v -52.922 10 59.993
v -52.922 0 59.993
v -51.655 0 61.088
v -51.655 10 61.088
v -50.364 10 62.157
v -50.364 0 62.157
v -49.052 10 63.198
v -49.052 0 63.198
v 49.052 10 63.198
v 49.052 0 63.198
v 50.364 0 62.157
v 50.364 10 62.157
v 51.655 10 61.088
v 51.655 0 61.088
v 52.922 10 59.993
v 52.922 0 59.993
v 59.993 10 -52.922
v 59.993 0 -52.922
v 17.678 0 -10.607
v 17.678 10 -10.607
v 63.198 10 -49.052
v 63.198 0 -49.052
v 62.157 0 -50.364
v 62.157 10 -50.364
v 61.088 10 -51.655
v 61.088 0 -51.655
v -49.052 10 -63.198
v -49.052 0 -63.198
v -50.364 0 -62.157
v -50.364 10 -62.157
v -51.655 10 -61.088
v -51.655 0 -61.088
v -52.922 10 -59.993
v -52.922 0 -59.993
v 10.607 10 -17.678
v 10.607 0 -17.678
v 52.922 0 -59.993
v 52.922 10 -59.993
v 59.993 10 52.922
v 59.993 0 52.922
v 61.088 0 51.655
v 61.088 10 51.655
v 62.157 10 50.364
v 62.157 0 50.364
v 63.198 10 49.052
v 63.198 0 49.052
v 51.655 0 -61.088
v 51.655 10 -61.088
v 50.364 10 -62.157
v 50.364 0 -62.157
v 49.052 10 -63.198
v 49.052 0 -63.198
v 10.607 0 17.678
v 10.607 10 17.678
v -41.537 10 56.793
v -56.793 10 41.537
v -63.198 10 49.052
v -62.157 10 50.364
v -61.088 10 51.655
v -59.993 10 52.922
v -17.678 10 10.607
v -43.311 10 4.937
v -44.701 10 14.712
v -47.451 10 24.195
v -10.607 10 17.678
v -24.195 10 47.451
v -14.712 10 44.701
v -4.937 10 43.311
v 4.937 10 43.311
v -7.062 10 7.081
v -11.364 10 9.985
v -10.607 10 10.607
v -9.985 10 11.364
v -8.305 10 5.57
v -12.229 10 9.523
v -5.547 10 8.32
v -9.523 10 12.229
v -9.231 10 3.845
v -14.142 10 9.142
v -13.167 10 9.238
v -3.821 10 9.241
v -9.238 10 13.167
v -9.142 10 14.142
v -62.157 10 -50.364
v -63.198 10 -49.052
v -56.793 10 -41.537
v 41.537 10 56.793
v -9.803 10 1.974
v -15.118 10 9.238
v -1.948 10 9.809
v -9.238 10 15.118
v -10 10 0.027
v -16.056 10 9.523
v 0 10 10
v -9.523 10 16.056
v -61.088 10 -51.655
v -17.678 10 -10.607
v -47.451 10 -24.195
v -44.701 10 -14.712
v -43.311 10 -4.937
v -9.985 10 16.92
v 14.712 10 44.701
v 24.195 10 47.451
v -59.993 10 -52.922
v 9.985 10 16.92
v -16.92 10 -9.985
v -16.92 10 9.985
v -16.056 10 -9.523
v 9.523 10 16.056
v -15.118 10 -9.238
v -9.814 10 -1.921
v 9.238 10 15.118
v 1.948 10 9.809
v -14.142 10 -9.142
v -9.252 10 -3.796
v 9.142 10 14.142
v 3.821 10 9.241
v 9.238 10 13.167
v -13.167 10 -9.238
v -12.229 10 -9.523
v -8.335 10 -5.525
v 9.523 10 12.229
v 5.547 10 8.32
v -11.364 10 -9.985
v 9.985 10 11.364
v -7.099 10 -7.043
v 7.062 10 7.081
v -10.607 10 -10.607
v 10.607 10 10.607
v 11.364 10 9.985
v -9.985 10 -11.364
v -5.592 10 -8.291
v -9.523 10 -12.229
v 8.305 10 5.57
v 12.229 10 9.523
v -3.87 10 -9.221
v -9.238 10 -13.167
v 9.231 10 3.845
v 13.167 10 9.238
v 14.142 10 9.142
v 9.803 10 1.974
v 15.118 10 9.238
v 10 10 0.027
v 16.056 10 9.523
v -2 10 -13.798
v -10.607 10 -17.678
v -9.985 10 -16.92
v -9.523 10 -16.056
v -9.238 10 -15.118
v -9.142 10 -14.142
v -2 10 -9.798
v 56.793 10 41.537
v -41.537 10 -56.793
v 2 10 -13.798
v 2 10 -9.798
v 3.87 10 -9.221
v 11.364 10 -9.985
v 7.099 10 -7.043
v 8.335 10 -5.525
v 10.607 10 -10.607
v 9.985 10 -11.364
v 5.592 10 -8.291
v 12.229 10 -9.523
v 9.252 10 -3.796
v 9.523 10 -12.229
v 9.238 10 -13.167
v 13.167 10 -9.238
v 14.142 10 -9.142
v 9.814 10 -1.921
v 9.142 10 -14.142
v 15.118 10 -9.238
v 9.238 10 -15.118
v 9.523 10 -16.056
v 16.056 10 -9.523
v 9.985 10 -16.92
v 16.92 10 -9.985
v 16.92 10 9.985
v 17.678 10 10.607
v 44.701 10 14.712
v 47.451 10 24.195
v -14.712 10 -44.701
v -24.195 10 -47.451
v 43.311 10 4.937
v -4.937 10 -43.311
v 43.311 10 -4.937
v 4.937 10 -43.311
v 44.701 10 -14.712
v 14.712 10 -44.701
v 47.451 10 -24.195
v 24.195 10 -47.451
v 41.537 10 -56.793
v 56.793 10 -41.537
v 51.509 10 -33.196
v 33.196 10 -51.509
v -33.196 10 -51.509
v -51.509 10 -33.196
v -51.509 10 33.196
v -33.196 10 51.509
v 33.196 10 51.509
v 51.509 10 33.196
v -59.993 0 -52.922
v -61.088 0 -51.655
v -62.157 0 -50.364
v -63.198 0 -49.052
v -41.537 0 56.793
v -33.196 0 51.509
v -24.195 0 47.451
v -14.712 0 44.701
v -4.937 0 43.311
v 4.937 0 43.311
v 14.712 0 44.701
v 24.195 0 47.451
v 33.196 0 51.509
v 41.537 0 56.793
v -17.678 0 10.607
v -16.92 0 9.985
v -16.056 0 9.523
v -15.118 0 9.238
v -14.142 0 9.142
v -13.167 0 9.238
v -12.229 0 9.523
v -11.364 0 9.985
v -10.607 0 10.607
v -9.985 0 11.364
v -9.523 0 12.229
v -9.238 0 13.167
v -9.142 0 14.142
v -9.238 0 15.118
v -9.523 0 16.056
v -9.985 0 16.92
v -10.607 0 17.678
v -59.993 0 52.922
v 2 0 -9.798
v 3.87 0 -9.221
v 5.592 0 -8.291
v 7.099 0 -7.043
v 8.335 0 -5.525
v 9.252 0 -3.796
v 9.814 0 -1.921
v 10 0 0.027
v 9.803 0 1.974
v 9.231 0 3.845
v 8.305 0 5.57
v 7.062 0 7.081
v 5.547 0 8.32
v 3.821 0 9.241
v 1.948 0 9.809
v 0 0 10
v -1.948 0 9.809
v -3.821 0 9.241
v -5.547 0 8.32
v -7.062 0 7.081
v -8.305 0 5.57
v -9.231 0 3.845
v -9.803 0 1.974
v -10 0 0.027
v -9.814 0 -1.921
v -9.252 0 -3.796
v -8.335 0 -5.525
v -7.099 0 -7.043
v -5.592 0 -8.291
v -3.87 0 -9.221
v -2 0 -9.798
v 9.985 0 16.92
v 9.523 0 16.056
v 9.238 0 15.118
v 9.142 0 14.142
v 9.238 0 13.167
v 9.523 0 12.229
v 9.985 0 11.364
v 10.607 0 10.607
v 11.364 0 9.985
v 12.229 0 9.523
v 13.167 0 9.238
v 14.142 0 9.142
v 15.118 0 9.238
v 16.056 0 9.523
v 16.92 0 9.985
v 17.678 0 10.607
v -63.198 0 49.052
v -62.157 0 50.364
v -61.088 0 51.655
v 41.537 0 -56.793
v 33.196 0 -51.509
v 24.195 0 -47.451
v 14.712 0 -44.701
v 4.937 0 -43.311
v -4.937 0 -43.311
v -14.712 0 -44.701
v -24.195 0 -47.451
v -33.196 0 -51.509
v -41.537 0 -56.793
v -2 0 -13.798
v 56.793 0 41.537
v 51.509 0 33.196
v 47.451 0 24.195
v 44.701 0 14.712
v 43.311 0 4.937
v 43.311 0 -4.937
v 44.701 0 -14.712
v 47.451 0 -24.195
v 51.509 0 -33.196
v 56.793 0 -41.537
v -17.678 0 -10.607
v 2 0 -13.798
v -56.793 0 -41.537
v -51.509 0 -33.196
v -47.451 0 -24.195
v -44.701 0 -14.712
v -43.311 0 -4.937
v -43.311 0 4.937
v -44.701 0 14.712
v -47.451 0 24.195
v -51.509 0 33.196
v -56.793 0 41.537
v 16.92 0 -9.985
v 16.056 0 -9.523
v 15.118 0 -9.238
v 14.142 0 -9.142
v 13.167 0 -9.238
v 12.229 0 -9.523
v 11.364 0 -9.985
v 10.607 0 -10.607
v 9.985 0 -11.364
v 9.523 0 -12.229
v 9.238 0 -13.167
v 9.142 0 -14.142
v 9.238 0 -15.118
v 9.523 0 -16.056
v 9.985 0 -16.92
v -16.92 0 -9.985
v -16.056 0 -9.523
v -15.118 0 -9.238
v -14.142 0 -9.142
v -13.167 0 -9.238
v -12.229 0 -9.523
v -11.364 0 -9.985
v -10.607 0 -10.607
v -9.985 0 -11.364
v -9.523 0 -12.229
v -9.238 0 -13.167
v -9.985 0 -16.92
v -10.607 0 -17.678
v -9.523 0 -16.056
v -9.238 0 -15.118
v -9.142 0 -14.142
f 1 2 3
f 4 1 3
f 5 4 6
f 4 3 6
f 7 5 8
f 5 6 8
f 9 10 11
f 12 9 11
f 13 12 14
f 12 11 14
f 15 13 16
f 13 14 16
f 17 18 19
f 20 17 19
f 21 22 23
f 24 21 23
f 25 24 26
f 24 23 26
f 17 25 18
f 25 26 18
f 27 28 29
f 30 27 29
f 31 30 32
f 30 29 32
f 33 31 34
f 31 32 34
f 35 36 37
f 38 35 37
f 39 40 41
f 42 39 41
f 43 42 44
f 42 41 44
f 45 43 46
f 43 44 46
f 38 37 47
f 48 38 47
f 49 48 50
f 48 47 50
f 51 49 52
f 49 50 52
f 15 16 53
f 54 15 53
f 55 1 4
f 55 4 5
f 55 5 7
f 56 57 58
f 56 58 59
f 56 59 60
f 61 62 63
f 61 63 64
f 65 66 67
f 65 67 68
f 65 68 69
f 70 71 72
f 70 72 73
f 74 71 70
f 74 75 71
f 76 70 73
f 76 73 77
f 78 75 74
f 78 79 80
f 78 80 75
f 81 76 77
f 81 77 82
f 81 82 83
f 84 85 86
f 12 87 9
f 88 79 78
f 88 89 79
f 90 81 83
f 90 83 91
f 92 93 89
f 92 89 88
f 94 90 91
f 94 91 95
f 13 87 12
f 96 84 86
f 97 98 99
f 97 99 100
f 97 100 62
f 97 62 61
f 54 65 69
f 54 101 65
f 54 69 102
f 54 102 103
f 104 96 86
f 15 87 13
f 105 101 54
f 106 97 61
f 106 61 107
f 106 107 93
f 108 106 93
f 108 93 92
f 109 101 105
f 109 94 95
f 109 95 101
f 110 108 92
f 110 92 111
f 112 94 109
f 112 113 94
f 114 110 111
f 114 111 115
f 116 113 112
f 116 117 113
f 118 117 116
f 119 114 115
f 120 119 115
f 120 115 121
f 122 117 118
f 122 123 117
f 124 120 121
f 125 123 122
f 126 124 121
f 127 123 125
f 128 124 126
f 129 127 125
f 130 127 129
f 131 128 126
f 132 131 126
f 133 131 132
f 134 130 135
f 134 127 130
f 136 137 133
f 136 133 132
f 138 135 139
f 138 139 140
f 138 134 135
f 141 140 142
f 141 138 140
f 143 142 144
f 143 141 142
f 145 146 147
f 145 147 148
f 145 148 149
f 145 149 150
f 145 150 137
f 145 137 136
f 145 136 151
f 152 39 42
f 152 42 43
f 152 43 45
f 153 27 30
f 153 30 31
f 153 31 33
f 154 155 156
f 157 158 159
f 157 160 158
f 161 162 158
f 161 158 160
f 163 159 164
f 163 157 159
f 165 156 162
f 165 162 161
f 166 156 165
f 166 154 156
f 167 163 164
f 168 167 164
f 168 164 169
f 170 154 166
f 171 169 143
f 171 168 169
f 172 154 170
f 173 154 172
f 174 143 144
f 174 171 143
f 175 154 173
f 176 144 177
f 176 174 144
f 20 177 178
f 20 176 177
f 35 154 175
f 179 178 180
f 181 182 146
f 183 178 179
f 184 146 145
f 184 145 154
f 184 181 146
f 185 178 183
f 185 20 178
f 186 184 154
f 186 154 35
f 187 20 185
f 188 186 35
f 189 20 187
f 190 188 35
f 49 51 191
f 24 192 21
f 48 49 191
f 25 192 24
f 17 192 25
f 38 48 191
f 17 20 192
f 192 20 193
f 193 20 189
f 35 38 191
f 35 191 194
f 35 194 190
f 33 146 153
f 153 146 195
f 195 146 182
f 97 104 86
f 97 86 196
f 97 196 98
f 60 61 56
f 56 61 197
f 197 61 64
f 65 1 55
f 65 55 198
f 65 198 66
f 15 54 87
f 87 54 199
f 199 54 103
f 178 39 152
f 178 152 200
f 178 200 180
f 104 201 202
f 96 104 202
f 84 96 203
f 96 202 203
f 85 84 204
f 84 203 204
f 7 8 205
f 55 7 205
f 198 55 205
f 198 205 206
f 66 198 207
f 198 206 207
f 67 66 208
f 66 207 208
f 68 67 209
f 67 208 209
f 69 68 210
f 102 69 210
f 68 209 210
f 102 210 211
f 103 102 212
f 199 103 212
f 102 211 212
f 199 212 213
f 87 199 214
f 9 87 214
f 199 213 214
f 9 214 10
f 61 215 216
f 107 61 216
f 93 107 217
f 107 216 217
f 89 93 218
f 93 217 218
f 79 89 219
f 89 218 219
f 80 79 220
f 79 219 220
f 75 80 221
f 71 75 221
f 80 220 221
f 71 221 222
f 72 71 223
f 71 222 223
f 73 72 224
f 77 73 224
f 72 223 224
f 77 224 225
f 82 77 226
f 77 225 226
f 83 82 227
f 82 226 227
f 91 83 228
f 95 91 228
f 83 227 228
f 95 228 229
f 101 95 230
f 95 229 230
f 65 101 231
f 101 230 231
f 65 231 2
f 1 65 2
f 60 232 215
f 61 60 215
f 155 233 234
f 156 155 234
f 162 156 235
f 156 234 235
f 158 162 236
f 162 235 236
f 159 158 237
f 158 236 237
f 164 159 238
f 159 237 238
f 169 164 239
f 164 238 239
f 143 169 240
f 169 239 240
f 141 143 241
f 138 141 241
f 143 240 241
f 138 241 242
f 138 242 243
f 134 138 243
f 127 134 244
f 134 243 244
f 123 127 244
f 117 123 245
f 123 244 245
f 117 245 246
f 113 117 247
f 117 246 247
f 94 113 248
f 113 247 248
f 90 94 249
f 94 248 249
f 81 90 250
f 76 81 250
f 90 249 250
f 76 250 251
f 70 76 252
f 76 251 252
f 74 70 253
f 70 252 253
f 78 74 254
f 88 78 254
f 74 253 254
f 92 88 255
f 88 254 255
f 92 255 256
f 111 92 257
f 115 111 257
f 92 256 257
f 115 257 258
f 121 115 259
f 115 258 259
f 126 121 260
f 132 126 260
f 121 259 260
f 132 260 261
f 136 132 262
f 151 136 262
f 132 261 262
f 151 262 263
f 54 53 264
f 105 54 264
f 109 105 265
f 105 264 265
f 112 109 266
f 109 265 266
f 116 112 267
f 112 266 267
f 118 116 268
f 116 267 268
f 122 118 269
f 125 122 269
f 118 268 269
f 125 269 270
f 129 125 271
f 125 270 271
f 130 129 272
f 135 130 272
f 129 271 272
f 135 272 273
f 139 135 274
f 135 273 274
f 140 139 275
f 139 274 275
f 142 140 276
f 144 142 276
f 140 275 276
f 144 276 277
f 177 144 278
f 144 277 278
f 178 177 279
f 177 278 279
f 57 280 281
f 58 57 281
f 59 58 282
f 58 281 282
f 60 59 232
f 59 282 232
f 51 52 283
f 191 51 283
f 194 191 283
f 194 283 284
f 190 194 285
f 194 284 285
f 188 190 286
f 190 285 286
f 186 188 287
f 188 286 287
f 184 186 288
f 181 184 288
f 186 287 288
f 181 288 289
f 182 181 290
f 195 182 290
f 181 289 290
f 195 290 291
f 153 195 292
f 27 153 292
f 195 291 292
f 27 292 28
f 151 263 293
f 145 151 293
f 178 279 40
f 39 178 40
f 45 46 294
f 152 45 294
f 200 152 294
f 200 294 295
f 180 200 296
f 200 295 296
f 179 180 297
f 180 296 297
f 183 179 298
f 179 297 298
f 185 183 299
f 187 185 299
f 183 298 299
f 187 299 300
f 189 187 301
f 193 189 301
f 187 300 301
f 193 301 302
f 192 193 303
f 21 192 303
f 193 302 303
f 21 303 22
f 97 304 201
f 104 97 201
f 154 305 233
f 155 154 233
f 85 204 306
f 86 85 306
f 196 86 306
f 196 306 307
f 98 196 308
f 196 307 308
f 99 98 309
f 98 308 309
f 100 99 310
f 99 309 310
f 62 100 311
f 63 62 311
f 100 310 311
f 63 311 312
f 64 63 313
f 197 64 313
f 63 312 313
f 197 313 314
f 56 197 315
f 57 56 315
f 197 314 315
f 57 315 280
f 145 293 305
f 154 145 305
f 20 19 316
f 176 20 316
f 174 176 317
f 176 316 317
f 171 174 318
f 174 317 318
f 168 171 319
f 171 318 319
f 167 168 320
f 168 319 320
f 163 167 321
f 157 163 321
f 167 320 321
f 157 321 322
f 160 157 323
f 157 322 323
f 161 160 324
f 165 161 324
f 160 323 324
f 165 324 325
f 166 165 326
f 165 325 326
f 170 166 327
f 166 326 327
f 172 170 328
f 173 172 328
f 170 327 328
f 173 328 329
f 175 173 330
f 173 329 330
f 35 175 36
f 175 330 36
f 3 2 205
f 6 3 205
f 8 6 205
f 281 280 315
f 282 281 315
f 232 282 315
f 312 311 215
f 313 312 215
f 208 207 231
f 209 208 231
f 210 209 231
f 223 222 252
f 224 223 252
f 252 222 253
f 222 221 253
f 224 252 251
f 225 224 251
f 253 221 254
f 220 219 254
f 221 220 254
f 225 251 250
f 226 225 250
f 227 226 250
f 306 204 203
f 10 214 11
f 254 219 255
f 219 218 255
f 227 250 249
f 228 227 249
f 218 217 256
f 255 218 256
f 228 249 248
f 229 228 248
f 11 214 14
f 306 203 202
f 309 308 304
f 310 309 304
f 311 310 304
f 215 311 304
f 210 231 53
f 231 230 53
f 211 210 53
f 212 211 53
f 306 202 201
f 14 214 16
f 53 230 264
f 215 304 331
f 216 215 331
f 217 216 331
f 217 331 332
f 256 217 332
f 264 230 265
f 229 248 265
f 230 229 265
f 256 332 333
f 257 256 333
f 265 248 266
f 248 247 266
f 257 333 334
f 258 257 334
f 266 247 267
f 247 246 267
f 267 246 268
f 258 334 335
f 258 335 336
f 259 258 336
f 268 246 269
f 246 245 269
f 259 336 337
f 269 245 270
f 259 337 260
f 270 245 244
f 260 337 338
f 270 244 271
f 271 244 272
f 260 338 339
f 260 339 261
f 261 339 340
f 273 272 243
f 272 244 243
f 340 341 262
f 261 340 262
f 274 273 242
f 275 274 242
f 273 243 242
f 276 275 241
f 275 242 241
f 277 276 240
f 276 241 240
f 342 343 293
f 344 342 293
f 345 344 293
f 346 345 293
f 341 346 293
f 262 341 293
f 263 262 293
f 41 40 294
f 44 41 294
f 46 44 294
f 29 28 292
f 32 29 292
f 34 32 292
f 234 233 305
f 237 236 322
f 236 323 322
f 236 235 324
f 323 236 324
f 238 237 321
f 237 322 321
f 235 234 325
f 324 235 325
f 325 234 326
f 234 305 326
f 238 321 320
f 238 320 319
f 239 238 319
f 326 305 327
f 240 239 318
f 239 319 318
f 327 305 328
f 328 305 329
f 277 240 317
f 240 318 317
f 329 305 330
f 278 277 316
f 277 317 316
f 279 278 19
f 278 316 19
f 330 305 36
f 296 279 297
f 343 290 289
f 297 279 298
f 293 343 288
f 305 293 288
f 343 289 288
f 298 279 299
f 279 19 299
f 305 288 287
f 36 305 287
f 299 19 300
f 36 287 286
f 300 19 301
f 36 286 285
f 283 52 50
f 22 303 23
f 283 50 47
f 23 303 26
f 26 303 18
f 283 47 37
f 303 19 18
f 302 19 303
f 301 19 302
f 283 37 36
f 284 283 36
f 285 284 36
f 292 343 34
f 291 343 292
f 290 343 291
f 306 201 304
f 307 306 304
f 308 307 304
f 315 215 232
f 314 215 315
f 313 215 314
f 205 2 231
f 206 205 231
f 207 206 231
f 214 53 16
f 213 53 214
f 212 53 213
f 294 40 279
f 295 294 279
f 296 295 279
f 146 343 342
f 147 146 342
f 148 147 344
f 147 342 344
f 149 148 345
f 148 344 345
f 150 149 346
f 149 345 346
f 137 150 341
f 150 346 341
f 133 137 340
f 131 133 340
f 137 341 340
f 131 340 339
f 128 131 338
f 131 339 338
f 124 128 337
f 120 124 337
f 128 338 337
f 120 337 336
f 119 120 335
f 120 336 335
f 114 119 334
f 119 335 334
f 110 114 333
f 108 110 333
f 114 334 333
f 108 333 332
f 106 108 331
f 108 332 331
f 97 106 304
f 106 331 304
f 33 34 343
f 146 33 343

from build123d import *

# Parameters (mm, degrees)
EXTRUDE_1_DEPTH = 10


with BuildPart() as part:
    # 草图1 → 凸台-拉伸1 (new body)
    with BuildSketch(Plane(origin=(0, 0, 0), x_dir=(1, 0, 0), z_dir=(0, 1, 0))):
        with BuildLine():
            Line((59.993482859, 52.922415047), (17.67766953, 10.606601718))
            ThreePointArc((17.67766953, 10.606601718), (10.606601718, 10.606601718), (10.606601718, 17.67766953))
            Line((10.606601718, 17.67766953), (52.922415047, 59.993482859))
            ThreePointArc((52.922415047, 59.993482859), (51.012147139, 61.625975402), (49.05155132, 63.197668573))
            ThreePointArc((49.05155132, 63.197668573), (0, 43.137085), (-49.05155132, 63.197668573))
            ThreePointArc((-49.05155132, 63.197668573), (-51.012147139, 61.625975402), (-52.922415047, 59.993482859))
            Line((-52.922415047, 59.993482859), (-10.606601718, 17.67766953))
            ThreePointArc((-10.606601718, 17.67766953), (-10.606601718, 10.606601718), (-17.67766953, 10.606601718))
            Line((-17.67766953, 10.606601718), (-59.993482859, 52.922415047))
            ThreePointArc((-59.993482859, 52.922415047), (-61.625975402, 51.012147139), (-63.197668573, 49.05155132))
            ThreePointArc((-63.197668573, 49.05155132), (-43.137085, 0), (-63.197668573, -49.05155132))
            ThreePointArc((-63.197668573, -49.05155132), (-61.625975402, -51.012147139), (-59.993482859, -52.922415047))
            Line((-59.993482859, -52.922415047), (-17.67766953, -10.606601718))
            ThreePointArc((-17.67766953, -10.606601718), (-10.606601718, -10.606601718), (-10.606601718, -17.67766953))
            Line((-10.606601718, -17.67766953), (-52.922415047, -59.993482859))
            ThreePointArc((-52.922415047, -59.993482859), (-51.012147139, -61.625975402), (-49.05155132, -63.197668573))
            ThreePointArc((-49.05155132, -63.197668573), (0, -43.137085), (49.05155132, -63.197668573))
            ThreePointArc((49.05155132, -63.197668573), (51.012147139, -61.625975402), (52.922415047, -59.993482859))
            Line((52.922415047, -59.993482859), (10.606601718, -17.67766953))
            ThreePointArc((10.606601718, -17.67766953), (10.606601718, -10.606601718), (17.67766953, -10.606601718))
            Line((17.67766953, -10.606601718), (59.993482859, -52.922415047))
            ThreePointArc((59.993482859, -52.922415047), (61.625975402, -51.012147139), (63.197668573, -49.05155132))
            ThreePointArc((63.197668573, -49.05155132), (43.137085, 0), (63.197668573, 49.05155132))
            ThreePointArc((63.197668573, 49.05155132), (61.625975402, 51.012147139), (59.993482859, 52.922415047))
        make_face()
        with BuildLine():
            Line((-2, 9.797958971), (-2, 13.797958971))
            Line((-2, 13.797958971), (2, 13.797958971))
            Line((2, 13.797958971), (2, 9.797958971))
            ThreePointArc((2, 9.797958971), (0, -10), (-2, 9.797958971))
        make_face(mode=Mode.SUBTRACT)
    extrude(amount=EXTRUDE_1_DEPTH)


solid = part.part
